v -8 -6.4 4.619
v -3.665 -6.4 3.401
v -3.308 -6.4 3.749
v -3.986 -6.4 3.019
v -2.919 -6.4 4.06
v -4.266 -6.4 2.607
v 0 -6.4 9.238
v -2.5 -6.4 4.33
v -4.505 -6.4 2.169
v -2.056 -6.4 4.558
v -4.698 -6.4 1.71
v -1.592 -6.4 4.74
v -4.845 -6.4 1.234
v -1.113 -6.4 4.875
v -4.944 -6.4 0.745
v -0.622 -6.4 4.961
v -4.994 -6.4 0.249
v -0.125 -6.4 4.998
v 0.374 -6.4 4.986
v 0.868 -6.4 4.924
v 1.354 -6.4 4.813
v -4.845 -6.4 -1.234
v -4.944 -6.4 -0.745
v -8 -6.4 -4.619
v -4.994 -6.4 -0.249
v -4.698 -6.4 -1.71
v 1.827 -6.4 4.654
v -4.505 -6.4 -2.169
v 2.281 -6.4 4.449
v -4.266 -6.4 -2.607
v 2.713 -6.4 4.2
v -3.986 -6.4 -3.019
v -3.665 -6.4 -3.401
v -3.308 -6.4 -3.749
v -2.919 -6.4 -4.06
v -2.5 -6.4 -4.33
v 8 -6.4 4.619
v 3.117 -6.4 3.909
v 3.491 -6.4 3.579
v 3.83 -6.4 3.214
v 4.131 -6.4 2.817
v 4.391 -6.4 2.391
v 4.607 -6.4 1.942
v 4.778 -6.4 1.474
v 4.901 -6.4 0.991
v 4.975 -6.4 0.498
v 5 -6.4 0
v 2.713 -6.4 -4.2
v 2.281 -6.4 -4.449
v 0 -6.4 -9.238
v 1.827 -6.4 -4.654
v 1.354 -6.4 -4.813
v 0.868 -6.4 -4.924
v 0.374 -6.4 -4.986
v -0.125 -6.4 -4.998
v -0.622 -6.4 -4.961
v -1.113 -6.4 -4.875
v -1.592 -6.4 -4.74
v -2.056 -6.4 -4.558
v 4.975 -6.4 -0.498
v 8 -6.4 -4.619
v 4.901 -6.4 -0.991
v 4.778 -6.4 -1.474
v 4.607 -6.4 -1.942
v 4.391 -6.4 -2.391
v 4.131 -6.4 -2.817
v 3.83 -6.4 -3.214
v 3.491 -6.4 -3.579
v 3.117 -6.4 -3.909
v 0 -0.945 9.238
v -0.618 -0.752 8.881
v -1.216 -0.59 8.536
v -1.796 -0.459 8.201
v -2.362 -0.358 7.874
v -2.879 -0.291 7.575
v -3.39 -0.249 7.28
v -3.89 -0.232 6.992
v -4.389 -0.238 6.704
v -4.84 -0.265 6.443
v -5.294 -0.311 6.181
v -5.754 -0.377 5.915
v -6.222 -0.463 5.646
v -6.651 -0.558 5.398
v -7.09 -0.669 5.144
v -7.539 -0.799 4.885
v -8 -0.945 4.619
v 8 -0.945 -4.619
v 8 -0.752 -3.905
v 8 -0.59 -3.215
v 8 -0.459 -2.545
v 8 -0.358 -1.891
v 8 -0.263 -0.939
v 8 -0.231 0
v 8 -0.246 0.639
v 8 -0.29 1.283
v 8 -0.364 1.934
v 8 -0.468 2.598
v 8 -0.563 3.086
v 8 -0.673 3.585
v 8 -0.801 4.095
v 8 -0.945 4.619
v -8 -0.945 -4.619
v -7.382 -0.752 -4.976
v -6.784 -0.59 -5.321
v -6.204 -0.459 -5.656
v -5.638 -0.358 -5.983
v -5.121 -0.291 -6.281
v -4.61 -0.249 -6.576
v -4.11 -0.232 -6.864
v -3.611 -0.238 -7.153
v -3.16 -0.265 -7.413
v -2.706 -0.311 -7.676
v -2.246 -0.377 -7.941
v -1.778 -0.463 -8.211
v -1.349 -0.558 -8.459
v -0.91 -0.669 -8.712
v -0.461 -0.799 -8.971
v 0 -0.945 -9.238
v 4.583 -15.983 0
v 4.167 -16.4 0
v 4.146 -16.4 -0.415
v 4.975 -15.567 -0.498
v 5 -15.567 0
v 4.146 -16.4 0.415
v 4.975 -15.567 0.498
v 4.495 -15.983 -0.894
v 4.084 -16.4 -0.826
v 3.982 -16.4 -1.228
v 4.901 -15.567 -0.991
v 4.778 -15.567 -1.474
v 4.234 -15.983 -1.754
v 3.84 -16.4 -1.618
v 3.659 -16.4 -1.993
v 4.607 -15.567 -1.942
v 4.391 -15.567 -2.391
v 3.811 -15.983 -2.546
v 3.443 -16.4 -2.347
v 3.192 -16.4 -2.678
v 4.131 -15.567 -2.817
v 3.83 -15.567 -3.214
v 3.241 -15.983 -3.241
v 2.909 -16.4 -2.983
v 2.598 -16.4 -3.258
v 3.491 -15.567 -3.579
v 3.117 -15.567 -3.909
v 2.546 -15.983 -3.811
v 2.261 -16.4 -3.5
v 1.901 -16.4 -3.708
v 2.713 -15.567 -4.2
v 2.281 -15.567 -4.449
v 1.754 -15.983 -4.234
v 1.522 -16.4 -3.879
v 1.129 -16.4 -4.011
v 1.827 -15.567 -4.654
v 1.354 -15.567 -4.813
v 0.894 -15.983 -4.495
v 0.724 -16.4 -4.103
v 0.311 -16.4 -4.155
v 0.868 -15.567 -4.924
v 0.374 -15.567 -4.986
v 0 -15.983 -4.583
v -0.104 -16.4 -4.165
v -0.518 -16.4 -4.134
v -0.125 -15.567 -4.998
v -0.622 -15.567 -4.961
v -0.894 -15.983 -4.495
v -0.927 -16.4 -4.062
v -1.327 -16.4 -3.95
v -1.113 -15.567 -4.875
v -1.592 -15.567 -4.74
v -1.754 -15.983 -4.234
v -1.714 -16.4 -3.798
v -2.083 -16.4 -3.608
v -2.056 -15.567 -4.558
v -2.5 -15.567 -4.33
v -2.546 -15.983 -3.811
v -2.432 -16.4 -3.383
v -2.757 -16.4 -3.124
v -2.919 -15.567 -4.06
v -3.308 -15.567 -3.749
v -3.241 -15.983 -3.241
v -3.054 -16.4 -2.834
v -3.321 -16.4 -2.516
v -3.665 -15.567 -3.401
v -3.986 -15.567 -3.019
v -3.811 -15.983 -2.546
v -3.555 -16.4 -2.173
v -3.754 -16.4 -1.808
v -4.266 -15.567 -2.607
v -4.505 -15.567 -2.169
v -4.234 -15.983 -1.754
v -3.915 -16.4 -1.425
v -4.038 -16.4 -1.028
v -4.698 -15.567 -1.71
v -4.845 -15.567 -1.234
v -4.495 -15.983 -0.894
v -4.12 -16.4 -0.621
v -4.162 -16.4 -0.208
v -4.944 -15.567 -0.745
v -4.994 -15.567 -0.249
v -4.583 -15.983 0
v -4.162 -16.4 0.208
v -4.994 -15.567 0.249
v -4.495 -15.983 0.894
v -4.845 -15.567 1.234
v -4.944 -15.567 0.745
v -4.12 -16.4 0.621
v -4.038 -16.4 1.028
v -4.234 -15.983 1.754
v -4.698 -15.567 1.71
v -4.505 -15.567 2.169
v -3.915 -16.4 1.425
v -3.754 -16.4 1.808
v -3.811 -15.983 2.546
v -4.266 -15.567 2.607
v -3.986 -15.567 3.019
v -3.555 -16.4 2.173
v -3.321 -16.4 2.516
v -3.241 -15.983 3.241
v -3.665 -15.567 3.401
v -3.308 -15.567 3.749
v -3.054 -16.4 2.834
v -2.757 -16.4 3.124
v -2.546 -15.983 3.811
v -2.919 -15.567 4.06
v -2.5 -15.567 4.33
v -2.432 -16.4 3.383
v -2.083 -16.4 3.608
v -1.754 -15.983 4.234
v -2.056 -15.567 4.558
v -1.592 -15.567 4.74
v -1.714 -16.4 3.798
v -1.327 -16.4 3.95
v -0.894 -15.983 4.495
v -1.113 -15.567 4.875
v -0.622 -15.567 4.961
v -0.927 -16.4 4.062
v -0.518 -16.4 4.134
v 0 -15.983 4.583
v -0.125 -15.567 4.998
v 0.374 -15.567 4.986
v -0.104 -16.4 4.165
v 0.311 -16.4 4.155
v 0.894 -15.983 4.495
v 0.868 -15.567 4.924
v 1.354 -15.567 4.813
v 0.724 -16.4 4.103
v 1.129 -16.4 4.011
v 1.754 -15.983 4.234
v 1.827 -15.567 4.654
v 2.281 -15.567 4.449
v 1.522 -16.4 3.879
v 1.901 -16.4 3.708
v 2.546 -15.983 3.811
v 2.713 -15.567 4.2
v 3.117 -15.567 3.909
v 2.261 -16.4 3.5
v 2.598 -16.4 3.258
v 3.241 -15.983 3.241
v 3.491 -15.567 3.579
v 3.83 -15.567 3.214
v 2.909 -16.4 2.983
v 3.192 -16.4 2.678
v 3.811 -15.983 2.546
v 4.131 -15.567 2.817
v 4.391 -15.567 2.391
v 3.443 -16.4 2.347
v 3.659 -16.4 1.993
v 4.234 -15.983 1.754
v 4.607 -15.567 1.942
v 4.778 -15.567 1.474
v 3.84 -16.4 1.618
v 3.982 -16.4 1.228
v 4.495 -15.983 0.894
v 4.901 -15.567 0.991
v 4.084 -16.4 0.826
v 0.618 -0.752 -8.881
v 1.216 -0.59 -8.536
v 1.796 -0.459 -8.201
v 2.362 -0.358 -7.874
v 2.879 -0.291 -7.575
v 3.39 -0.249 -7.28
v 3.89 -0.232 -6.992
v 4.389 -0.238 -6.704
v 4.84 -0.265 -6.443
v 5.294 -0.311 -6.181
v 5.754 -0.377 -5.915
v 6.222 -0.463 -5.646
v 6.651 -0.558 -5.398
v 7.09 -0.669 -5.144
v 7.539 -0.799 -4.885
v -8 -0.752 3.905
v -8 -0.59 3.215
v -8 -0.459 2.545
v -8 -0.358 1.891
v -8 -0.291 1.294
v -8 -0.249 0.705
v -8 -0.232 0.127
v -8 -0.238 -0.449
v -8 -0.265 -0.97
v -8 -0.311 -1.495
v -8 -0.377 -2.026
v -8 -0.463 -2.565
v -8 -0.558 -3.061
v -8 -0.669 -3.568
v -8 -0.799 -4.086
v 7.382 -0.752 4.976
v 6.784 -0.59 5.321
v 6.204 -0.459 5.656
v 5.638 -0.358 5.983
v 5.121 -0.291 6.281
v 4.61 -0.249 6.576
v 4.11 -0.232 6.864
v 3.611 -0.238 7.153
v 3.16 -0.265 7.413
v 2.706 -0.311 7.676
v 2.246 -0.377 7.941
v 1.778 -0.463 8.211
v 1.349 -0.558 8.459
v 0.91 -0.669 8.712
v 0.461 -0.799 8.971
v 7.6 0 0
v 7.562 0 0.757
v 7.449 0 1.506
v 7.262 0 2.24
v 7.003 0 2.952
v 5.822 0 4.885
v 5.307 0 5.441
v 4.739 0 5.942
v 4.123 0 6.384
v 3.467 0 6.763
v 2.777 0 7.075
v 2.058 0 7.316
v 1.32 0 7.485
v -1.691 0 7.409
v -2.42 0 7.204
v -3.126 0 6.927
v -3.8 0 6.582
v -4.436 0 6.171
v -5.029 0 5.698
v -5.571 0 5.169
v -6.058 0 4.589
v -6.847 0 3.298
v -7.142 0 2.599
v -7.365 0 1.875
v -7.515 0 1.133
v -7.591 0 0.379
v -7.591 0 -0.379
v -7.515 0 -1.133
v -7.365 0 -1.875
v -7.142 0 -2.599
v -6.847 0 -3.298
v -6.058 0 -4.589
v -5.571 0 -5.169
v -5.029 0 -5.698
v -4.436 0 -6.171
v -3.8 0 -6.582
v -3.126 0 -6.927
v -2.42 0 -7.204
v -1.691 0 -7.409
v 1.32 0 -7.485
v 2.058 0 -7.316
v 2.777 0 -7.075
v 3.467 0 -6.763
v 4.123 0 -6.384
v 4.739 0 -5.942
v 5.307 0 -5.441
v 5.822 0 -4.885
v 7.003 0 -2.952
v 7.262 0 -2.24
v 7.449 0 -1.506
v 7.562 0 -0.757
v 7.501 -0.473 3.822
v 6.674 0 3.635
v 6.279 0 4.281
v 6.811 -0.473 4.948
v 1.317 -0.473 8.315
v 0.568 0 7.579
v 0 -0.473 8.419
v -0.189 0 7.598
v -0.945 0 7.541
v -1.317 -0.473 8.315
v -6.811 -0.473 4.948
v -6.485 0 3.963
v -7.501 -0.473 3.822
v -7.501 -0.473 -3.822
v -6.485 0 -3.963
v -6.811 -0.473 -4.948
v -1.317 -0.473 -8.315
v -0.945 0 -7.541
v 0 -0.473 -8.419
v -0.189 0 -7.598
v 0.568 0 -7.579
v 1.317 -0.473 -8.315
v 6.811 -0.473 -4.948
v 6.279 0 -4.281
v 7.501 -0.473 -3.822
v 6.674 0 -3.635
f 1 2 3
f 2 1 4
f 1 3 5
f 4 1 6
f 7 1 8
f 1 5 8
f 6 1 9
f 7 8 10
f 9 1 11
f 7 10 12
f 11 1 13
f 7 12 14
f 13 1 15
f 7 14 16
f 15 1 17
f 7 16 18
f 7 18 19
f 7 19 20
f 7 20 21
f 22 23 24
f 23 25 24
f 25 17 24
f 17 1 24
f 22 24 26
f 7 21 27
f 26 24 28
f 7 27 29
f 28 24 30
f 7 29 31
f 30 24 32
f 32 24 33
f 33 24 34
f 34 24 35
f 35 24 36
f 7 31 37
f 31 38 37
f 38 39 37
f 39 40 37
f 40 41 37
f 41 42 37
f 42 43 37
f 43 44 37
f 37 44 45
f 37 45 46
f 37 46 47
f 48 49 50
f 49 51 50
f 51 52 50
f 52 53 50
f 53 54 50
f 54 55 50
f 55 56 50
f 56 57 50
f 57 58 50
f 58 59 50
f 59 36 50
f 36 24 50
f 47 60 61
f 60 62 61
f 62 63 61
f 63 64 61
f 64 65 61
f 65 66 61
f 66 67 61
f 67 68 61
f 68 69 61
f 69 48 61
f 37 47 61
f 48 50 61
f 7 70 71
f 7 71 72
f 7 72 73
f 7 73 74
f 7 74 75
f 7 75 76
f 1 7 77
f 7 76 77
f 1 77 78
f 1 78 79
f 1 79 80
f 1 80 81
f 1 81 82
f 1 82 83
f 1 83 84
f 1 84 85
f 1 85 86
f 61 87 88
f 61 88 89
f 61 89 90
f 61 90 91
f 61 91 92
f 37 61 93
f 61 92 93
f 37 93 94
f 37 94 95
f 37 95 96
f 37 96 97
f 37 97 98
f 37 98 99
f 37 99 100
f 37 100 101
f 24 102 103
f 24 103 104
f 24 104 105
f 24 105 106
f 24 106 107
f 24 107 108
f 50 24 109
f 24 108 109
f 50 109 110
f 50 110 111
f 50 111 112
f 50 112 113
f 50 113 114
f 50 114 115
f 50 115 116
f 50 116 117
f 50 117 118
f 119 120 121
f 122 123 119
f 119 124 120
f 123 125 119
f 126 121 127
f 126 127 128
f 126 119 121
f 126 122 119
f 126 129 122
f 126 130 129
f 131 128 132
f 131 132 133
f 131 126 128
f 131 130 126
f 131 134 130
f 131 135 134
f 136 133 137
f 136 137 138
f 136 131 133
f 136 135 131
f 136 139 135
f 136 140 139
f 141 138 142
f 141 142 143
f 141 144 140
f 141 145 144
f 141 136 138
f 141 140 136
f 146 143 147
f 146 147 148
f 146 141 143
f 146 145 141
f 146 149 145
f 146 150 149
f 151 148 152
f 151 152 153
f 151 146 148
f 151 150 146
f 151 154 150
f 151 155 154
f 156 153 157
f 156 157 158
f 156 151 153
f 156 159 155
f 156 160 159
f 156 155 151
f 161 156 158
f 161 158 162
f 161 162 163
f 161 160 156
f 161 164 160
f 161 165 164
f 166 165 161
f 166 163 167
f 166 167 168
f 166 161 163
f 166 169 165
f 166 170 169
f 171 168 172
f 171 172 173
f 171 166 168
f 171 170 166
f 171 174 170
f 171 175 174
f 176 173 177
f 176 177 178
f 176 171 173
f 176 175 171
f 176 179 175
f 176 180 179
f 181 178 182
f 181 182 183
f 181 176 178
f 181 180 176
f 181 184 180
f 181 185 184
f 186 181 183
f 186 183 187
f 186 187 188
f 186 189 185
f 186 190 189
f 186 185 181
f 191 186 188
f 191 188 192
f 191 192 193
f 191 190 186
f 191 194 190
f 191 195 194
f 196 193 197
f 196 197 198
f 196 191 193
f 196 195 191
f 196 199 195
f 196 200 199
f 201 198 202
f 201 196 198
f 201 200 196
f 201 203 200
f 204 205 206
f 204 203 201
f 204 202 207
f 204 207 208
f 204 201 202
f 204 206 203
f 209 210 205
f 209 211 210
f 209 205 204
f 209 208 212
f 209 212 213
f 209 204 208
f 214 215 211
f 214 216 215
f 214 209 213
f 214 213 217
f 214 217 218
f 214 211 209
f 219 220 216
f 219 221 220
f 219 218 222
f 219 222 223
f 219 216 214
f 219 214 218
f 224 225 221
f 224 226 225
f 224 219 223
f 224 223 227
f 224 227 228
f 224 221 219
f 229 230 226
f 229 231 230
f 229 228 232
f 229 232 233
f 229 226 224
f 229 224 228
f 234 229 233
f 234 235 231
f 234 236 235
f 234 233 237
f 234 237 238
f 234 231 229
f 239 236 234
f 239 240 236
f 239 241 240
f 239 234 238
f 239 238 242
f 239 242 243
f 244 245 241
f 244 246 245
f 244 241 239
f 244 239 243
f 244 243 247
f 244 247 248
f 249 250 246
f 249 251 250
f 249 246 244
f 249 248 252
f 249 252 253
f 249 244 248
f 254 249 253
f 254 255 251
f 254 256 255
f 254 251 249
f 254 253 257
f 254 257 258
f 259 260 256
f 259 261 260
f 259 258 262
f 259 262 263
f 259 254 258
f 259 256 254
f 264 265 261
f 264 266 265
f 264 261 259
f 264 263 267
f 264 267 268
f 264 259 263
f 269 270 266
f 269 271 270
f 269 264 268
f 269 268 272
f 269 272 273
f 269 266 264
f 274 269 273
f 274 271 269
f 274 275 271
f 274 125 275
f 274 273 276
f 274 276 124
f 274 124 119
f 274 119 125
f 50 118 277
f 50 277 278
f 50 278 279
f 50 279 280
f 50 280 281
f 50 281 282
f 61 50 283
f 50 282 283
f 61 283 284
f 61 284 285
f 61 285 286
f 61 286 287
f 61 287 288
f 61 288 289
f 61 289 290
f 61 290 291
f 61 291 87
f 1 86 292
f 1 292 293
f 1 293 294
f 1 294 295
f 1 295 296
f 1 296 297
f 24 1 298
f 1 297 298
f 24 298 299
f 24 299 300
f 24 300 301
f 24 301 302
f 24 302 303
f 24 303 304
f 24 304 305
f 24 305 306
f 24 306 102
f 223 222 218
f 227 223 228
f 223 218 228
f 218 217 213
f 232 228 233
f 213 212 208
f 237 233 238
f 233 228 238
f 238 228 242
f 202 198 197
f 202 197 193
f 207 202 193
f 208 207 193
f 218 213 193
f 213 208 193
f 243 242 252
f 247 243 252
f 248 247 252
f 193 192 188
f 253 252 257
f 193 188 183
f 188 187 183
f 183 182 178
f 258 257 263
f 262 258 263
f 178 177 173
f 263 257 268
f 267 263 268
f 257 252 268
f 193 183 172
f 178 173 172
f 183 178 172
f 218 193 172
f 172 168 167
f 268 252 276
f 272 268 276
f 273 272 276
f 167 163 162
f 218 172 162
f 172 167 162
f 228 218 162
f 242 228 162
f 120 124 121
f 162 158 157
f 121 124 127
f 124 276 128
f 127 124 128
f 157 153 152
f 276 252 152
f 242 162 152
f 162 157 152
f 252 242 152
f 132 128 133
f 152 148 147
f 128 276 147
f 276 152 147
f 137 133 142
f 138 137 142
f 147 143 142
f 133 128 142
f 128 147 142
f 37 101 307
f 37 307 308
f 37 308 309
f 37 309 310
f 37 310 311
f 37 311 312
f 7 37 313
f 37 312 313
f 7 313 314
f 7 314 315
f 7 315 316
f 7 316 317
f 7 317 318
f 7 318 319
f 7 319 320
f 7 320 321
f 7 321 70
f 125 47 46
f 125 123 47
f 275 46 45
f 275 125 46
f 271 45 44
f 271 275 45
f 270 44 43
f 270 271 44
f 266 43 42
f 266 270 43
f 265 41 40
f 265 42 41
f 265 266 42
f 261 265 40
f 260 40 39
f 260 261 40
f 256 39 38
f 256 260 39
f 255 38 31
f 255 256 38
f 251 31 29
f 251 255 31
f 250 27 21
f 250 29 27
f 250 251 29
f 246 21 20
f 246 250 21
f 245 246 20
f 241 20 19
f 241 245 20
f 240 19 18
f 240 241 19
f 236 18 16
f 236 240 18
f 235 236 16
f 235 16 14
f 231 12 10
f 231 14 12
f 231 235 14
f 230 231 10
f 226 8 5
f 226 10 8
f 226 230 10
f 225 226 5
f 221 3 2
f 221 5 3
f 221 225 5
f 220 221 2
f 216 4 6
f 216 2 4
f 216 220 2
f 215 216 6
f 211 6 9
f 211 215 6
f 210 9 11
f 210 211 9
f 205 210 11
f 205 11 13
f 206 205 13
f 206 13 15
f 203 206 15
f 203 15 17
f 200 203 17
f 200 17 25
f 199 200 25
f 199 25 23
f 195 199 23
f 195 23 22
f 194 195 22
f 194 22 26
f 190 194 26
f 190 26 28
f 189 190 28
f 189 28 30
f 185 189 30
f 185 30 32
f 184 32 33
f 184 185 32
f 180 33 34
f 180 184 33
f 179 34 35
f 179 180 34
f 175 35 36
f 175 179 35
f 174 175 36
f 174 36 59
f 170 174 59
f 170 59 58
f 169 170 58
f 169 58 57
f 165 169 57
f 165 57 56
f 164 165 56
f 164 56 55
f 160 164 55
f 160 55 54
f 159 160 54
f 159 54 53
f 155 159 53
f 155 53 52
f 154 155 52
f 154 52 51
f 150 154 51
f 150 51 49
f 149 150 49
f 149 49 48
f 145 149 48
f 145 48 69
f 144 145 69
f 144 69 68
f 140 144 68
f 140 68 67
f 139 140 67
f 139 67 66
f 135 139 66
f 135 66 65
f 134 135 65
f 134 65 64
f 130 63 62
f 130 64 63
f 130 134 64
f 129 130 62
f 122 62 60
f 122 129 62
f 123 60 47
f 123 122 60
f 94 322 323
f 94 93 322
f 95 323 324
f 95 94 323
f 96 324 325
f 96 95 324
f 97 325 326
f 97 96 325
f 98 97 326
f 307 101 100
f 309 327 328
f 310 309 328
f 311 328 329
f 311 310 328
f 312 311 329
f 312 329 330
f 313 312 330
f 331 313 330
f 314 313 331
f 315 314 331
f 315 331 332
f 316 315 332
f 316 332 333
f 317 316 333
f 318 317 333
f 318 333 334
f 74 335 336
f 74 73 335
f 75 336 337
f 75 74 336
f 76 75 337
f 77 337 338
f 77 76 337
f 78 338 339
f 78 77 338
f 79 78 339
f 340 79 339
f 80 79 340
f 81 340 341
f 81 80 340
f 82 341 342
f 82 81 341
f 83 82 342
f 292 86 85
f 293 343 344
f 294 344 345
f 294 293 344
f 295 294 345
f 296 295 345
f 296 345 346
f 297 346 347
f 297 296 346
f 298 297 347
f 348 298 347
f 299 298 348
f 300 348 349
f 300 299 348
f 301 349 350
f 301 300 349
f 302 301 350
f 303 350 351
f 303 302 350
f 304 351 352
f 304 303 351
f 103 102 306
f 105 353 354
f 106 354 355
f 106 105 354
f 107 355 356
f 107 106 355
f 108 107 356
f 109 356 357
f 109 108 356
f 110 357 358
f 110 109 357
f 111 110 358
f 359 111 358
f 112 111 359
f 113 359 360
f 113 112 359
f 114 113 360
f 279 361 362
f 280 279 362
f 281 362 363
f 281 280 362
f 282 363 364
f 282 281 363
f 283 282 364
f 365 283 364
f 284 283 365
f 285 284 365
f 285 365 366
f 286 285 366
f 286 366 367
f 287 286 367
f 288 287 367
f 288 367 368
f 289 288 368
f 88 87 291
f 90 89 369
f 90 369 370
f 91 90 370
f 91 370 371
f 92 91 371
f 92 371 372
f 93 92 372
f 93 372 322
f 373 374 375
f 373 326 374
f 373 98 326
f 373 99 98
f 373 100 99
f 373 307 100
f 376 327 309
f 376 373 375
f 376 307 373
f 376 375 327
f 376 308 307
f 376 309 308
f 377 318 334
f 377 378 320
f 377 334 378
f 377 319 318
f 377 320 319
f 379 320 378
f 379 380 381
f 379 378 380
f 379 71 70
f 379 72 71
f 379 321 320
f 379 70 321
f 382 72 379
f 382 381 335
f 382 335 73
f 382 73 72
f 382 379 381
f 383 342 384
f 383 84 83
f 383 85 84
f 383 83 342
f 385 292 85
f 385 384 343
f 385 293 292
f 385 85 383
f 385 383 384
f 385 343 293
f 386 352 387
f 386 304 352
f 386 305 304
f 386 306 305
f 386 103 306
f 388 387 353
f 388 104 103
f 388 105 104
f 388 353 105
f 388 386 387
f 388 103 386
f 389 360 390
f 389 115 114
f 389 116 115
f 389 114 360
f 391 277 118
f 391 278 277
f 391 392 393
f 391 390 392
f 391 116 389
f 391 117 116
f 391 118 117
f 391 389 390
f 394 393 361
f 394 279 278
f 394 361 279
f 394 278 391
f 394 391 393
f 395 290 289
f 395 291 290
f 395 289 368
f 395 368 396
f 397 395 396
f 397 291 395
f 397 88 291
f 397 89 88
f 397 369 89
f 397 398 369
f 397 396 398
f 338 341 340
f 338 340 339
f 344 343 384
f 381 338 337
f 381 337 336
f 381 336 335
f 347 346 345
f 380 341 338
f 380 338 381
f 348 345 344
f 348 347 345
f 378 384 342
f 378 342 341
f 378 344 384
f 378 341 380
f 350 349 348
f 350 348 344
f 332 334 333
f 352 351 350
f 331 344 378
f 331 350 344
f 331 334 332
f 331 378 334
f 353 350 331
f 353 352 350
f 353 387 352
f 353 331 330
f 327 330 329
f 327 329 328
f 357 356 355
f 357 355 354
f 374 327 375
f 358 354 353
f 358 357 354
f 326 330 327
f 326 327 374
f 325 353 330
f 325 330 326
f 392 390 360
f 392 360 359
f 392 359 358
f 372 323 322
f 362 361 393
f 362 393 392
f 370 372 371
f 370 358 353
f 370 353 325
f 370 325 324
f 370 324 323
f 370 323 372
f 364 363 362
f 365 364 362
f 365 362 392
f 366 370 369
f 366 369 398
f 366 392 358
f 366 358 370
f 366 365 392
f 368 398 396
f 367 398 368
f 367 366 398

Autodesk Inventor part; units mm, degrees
ref_plane "YZ Plane" through (0, 0, 0) normal (1, 0, 0) x (0, 1, 0)
ref_plane "XZ Plane" through (0, 0, 0) normal (0, 1, 0) x (-1, 0, 0)
ref_plane "XY Plane" through (0, 0, 0) normal (0, 0, 1) x (1, 0, 0)
sketch "Sketch1" plane through (0, 0, 0) normal (0, 0, 1) x (1, 0, 0)
  line L0 (0, 0) -> (7.6, 0)
  line L1 (12, -2.5403) -> (12, -6.4)
  line L2 (12, -6.4) -> (5, -6.4)
  line L3 (5, -6.4) -> (5, -16.4)
  line L4 (5, -16.4) -> (0, -16.4)
  line L5 (0, -16.4) -> (0, 0)
  line L6 (7.6, 0) -> (12, -2.5403)
  dimension "d0" = 24
  dimension "d1" = 10
  dimension "d2" = 6.4
  dimension "d3" = 10
  dimension "d20" = 30
  dimension "d21" = 15.2
revolve "Вращение1" add sketch "Sketch1" angle 360 about axis through (0, -16.4, 0) along (0, 1, 0)
sketch "Sketch2" plane through (0, 0, 0) normal (0, 1, 0) x (1, 0, 0)
  line L0 (0, -9.2376) -> (-8, -4.6188)
  line L1 (-8, -4.6188) -> (-8, 4.6188)
  line L2 (-8, 4.6188) -> (0, 9.2376)
  line L3 (0, 9.2376) -> (8, 4.6188)
  line L4 (8, 4.6188) -> (8, -4.6188)
  line L5 (8, -4.6188) -> (0, -9.2376)
  circle A0 centre (0, 0) radius 12 projected
  point P0 (0, 0)
  point P1 (0, 0)
  dimension "d22" = 16
extrude "Выдавливание1" cut sketch "Sketch2" against normal blind 6.4
thread "Резьба1" size "M10x1.5" class "6g" standard "ISO Metric profile" length 8
chamfer "Фаска1" distance 0.8333 angle 45 1 edges at (-5, -16.4, 0)
equation "\"d22\" = S_"
equation "\"d23\" = k"
equation "\"d12\" = b"
equation "\"d14\" = 0.0833333 * d"
equation "\"d0\" = 1.5 * S_"
equation "\"d1\" = d1_"
equation "\"d2\" = k"
equation "\"d3\" = L"
equation "\"d21\" = 0.95 * S_"
equation "\"d1_\" = 10"
equation "\"S_\" = 16"
equation "\"k\" = 6.4"
equation "\"e\" = 17.6"
equation "\"L\" = 10"
equation "\"b\" = 8"
equation "\"Grip_Length\" = 2"
equation "\"d\" = 10"
properties part number "Болт M10-6g×10(S16) ГОСТ 7798-70" material "Сталь, мягкая"
